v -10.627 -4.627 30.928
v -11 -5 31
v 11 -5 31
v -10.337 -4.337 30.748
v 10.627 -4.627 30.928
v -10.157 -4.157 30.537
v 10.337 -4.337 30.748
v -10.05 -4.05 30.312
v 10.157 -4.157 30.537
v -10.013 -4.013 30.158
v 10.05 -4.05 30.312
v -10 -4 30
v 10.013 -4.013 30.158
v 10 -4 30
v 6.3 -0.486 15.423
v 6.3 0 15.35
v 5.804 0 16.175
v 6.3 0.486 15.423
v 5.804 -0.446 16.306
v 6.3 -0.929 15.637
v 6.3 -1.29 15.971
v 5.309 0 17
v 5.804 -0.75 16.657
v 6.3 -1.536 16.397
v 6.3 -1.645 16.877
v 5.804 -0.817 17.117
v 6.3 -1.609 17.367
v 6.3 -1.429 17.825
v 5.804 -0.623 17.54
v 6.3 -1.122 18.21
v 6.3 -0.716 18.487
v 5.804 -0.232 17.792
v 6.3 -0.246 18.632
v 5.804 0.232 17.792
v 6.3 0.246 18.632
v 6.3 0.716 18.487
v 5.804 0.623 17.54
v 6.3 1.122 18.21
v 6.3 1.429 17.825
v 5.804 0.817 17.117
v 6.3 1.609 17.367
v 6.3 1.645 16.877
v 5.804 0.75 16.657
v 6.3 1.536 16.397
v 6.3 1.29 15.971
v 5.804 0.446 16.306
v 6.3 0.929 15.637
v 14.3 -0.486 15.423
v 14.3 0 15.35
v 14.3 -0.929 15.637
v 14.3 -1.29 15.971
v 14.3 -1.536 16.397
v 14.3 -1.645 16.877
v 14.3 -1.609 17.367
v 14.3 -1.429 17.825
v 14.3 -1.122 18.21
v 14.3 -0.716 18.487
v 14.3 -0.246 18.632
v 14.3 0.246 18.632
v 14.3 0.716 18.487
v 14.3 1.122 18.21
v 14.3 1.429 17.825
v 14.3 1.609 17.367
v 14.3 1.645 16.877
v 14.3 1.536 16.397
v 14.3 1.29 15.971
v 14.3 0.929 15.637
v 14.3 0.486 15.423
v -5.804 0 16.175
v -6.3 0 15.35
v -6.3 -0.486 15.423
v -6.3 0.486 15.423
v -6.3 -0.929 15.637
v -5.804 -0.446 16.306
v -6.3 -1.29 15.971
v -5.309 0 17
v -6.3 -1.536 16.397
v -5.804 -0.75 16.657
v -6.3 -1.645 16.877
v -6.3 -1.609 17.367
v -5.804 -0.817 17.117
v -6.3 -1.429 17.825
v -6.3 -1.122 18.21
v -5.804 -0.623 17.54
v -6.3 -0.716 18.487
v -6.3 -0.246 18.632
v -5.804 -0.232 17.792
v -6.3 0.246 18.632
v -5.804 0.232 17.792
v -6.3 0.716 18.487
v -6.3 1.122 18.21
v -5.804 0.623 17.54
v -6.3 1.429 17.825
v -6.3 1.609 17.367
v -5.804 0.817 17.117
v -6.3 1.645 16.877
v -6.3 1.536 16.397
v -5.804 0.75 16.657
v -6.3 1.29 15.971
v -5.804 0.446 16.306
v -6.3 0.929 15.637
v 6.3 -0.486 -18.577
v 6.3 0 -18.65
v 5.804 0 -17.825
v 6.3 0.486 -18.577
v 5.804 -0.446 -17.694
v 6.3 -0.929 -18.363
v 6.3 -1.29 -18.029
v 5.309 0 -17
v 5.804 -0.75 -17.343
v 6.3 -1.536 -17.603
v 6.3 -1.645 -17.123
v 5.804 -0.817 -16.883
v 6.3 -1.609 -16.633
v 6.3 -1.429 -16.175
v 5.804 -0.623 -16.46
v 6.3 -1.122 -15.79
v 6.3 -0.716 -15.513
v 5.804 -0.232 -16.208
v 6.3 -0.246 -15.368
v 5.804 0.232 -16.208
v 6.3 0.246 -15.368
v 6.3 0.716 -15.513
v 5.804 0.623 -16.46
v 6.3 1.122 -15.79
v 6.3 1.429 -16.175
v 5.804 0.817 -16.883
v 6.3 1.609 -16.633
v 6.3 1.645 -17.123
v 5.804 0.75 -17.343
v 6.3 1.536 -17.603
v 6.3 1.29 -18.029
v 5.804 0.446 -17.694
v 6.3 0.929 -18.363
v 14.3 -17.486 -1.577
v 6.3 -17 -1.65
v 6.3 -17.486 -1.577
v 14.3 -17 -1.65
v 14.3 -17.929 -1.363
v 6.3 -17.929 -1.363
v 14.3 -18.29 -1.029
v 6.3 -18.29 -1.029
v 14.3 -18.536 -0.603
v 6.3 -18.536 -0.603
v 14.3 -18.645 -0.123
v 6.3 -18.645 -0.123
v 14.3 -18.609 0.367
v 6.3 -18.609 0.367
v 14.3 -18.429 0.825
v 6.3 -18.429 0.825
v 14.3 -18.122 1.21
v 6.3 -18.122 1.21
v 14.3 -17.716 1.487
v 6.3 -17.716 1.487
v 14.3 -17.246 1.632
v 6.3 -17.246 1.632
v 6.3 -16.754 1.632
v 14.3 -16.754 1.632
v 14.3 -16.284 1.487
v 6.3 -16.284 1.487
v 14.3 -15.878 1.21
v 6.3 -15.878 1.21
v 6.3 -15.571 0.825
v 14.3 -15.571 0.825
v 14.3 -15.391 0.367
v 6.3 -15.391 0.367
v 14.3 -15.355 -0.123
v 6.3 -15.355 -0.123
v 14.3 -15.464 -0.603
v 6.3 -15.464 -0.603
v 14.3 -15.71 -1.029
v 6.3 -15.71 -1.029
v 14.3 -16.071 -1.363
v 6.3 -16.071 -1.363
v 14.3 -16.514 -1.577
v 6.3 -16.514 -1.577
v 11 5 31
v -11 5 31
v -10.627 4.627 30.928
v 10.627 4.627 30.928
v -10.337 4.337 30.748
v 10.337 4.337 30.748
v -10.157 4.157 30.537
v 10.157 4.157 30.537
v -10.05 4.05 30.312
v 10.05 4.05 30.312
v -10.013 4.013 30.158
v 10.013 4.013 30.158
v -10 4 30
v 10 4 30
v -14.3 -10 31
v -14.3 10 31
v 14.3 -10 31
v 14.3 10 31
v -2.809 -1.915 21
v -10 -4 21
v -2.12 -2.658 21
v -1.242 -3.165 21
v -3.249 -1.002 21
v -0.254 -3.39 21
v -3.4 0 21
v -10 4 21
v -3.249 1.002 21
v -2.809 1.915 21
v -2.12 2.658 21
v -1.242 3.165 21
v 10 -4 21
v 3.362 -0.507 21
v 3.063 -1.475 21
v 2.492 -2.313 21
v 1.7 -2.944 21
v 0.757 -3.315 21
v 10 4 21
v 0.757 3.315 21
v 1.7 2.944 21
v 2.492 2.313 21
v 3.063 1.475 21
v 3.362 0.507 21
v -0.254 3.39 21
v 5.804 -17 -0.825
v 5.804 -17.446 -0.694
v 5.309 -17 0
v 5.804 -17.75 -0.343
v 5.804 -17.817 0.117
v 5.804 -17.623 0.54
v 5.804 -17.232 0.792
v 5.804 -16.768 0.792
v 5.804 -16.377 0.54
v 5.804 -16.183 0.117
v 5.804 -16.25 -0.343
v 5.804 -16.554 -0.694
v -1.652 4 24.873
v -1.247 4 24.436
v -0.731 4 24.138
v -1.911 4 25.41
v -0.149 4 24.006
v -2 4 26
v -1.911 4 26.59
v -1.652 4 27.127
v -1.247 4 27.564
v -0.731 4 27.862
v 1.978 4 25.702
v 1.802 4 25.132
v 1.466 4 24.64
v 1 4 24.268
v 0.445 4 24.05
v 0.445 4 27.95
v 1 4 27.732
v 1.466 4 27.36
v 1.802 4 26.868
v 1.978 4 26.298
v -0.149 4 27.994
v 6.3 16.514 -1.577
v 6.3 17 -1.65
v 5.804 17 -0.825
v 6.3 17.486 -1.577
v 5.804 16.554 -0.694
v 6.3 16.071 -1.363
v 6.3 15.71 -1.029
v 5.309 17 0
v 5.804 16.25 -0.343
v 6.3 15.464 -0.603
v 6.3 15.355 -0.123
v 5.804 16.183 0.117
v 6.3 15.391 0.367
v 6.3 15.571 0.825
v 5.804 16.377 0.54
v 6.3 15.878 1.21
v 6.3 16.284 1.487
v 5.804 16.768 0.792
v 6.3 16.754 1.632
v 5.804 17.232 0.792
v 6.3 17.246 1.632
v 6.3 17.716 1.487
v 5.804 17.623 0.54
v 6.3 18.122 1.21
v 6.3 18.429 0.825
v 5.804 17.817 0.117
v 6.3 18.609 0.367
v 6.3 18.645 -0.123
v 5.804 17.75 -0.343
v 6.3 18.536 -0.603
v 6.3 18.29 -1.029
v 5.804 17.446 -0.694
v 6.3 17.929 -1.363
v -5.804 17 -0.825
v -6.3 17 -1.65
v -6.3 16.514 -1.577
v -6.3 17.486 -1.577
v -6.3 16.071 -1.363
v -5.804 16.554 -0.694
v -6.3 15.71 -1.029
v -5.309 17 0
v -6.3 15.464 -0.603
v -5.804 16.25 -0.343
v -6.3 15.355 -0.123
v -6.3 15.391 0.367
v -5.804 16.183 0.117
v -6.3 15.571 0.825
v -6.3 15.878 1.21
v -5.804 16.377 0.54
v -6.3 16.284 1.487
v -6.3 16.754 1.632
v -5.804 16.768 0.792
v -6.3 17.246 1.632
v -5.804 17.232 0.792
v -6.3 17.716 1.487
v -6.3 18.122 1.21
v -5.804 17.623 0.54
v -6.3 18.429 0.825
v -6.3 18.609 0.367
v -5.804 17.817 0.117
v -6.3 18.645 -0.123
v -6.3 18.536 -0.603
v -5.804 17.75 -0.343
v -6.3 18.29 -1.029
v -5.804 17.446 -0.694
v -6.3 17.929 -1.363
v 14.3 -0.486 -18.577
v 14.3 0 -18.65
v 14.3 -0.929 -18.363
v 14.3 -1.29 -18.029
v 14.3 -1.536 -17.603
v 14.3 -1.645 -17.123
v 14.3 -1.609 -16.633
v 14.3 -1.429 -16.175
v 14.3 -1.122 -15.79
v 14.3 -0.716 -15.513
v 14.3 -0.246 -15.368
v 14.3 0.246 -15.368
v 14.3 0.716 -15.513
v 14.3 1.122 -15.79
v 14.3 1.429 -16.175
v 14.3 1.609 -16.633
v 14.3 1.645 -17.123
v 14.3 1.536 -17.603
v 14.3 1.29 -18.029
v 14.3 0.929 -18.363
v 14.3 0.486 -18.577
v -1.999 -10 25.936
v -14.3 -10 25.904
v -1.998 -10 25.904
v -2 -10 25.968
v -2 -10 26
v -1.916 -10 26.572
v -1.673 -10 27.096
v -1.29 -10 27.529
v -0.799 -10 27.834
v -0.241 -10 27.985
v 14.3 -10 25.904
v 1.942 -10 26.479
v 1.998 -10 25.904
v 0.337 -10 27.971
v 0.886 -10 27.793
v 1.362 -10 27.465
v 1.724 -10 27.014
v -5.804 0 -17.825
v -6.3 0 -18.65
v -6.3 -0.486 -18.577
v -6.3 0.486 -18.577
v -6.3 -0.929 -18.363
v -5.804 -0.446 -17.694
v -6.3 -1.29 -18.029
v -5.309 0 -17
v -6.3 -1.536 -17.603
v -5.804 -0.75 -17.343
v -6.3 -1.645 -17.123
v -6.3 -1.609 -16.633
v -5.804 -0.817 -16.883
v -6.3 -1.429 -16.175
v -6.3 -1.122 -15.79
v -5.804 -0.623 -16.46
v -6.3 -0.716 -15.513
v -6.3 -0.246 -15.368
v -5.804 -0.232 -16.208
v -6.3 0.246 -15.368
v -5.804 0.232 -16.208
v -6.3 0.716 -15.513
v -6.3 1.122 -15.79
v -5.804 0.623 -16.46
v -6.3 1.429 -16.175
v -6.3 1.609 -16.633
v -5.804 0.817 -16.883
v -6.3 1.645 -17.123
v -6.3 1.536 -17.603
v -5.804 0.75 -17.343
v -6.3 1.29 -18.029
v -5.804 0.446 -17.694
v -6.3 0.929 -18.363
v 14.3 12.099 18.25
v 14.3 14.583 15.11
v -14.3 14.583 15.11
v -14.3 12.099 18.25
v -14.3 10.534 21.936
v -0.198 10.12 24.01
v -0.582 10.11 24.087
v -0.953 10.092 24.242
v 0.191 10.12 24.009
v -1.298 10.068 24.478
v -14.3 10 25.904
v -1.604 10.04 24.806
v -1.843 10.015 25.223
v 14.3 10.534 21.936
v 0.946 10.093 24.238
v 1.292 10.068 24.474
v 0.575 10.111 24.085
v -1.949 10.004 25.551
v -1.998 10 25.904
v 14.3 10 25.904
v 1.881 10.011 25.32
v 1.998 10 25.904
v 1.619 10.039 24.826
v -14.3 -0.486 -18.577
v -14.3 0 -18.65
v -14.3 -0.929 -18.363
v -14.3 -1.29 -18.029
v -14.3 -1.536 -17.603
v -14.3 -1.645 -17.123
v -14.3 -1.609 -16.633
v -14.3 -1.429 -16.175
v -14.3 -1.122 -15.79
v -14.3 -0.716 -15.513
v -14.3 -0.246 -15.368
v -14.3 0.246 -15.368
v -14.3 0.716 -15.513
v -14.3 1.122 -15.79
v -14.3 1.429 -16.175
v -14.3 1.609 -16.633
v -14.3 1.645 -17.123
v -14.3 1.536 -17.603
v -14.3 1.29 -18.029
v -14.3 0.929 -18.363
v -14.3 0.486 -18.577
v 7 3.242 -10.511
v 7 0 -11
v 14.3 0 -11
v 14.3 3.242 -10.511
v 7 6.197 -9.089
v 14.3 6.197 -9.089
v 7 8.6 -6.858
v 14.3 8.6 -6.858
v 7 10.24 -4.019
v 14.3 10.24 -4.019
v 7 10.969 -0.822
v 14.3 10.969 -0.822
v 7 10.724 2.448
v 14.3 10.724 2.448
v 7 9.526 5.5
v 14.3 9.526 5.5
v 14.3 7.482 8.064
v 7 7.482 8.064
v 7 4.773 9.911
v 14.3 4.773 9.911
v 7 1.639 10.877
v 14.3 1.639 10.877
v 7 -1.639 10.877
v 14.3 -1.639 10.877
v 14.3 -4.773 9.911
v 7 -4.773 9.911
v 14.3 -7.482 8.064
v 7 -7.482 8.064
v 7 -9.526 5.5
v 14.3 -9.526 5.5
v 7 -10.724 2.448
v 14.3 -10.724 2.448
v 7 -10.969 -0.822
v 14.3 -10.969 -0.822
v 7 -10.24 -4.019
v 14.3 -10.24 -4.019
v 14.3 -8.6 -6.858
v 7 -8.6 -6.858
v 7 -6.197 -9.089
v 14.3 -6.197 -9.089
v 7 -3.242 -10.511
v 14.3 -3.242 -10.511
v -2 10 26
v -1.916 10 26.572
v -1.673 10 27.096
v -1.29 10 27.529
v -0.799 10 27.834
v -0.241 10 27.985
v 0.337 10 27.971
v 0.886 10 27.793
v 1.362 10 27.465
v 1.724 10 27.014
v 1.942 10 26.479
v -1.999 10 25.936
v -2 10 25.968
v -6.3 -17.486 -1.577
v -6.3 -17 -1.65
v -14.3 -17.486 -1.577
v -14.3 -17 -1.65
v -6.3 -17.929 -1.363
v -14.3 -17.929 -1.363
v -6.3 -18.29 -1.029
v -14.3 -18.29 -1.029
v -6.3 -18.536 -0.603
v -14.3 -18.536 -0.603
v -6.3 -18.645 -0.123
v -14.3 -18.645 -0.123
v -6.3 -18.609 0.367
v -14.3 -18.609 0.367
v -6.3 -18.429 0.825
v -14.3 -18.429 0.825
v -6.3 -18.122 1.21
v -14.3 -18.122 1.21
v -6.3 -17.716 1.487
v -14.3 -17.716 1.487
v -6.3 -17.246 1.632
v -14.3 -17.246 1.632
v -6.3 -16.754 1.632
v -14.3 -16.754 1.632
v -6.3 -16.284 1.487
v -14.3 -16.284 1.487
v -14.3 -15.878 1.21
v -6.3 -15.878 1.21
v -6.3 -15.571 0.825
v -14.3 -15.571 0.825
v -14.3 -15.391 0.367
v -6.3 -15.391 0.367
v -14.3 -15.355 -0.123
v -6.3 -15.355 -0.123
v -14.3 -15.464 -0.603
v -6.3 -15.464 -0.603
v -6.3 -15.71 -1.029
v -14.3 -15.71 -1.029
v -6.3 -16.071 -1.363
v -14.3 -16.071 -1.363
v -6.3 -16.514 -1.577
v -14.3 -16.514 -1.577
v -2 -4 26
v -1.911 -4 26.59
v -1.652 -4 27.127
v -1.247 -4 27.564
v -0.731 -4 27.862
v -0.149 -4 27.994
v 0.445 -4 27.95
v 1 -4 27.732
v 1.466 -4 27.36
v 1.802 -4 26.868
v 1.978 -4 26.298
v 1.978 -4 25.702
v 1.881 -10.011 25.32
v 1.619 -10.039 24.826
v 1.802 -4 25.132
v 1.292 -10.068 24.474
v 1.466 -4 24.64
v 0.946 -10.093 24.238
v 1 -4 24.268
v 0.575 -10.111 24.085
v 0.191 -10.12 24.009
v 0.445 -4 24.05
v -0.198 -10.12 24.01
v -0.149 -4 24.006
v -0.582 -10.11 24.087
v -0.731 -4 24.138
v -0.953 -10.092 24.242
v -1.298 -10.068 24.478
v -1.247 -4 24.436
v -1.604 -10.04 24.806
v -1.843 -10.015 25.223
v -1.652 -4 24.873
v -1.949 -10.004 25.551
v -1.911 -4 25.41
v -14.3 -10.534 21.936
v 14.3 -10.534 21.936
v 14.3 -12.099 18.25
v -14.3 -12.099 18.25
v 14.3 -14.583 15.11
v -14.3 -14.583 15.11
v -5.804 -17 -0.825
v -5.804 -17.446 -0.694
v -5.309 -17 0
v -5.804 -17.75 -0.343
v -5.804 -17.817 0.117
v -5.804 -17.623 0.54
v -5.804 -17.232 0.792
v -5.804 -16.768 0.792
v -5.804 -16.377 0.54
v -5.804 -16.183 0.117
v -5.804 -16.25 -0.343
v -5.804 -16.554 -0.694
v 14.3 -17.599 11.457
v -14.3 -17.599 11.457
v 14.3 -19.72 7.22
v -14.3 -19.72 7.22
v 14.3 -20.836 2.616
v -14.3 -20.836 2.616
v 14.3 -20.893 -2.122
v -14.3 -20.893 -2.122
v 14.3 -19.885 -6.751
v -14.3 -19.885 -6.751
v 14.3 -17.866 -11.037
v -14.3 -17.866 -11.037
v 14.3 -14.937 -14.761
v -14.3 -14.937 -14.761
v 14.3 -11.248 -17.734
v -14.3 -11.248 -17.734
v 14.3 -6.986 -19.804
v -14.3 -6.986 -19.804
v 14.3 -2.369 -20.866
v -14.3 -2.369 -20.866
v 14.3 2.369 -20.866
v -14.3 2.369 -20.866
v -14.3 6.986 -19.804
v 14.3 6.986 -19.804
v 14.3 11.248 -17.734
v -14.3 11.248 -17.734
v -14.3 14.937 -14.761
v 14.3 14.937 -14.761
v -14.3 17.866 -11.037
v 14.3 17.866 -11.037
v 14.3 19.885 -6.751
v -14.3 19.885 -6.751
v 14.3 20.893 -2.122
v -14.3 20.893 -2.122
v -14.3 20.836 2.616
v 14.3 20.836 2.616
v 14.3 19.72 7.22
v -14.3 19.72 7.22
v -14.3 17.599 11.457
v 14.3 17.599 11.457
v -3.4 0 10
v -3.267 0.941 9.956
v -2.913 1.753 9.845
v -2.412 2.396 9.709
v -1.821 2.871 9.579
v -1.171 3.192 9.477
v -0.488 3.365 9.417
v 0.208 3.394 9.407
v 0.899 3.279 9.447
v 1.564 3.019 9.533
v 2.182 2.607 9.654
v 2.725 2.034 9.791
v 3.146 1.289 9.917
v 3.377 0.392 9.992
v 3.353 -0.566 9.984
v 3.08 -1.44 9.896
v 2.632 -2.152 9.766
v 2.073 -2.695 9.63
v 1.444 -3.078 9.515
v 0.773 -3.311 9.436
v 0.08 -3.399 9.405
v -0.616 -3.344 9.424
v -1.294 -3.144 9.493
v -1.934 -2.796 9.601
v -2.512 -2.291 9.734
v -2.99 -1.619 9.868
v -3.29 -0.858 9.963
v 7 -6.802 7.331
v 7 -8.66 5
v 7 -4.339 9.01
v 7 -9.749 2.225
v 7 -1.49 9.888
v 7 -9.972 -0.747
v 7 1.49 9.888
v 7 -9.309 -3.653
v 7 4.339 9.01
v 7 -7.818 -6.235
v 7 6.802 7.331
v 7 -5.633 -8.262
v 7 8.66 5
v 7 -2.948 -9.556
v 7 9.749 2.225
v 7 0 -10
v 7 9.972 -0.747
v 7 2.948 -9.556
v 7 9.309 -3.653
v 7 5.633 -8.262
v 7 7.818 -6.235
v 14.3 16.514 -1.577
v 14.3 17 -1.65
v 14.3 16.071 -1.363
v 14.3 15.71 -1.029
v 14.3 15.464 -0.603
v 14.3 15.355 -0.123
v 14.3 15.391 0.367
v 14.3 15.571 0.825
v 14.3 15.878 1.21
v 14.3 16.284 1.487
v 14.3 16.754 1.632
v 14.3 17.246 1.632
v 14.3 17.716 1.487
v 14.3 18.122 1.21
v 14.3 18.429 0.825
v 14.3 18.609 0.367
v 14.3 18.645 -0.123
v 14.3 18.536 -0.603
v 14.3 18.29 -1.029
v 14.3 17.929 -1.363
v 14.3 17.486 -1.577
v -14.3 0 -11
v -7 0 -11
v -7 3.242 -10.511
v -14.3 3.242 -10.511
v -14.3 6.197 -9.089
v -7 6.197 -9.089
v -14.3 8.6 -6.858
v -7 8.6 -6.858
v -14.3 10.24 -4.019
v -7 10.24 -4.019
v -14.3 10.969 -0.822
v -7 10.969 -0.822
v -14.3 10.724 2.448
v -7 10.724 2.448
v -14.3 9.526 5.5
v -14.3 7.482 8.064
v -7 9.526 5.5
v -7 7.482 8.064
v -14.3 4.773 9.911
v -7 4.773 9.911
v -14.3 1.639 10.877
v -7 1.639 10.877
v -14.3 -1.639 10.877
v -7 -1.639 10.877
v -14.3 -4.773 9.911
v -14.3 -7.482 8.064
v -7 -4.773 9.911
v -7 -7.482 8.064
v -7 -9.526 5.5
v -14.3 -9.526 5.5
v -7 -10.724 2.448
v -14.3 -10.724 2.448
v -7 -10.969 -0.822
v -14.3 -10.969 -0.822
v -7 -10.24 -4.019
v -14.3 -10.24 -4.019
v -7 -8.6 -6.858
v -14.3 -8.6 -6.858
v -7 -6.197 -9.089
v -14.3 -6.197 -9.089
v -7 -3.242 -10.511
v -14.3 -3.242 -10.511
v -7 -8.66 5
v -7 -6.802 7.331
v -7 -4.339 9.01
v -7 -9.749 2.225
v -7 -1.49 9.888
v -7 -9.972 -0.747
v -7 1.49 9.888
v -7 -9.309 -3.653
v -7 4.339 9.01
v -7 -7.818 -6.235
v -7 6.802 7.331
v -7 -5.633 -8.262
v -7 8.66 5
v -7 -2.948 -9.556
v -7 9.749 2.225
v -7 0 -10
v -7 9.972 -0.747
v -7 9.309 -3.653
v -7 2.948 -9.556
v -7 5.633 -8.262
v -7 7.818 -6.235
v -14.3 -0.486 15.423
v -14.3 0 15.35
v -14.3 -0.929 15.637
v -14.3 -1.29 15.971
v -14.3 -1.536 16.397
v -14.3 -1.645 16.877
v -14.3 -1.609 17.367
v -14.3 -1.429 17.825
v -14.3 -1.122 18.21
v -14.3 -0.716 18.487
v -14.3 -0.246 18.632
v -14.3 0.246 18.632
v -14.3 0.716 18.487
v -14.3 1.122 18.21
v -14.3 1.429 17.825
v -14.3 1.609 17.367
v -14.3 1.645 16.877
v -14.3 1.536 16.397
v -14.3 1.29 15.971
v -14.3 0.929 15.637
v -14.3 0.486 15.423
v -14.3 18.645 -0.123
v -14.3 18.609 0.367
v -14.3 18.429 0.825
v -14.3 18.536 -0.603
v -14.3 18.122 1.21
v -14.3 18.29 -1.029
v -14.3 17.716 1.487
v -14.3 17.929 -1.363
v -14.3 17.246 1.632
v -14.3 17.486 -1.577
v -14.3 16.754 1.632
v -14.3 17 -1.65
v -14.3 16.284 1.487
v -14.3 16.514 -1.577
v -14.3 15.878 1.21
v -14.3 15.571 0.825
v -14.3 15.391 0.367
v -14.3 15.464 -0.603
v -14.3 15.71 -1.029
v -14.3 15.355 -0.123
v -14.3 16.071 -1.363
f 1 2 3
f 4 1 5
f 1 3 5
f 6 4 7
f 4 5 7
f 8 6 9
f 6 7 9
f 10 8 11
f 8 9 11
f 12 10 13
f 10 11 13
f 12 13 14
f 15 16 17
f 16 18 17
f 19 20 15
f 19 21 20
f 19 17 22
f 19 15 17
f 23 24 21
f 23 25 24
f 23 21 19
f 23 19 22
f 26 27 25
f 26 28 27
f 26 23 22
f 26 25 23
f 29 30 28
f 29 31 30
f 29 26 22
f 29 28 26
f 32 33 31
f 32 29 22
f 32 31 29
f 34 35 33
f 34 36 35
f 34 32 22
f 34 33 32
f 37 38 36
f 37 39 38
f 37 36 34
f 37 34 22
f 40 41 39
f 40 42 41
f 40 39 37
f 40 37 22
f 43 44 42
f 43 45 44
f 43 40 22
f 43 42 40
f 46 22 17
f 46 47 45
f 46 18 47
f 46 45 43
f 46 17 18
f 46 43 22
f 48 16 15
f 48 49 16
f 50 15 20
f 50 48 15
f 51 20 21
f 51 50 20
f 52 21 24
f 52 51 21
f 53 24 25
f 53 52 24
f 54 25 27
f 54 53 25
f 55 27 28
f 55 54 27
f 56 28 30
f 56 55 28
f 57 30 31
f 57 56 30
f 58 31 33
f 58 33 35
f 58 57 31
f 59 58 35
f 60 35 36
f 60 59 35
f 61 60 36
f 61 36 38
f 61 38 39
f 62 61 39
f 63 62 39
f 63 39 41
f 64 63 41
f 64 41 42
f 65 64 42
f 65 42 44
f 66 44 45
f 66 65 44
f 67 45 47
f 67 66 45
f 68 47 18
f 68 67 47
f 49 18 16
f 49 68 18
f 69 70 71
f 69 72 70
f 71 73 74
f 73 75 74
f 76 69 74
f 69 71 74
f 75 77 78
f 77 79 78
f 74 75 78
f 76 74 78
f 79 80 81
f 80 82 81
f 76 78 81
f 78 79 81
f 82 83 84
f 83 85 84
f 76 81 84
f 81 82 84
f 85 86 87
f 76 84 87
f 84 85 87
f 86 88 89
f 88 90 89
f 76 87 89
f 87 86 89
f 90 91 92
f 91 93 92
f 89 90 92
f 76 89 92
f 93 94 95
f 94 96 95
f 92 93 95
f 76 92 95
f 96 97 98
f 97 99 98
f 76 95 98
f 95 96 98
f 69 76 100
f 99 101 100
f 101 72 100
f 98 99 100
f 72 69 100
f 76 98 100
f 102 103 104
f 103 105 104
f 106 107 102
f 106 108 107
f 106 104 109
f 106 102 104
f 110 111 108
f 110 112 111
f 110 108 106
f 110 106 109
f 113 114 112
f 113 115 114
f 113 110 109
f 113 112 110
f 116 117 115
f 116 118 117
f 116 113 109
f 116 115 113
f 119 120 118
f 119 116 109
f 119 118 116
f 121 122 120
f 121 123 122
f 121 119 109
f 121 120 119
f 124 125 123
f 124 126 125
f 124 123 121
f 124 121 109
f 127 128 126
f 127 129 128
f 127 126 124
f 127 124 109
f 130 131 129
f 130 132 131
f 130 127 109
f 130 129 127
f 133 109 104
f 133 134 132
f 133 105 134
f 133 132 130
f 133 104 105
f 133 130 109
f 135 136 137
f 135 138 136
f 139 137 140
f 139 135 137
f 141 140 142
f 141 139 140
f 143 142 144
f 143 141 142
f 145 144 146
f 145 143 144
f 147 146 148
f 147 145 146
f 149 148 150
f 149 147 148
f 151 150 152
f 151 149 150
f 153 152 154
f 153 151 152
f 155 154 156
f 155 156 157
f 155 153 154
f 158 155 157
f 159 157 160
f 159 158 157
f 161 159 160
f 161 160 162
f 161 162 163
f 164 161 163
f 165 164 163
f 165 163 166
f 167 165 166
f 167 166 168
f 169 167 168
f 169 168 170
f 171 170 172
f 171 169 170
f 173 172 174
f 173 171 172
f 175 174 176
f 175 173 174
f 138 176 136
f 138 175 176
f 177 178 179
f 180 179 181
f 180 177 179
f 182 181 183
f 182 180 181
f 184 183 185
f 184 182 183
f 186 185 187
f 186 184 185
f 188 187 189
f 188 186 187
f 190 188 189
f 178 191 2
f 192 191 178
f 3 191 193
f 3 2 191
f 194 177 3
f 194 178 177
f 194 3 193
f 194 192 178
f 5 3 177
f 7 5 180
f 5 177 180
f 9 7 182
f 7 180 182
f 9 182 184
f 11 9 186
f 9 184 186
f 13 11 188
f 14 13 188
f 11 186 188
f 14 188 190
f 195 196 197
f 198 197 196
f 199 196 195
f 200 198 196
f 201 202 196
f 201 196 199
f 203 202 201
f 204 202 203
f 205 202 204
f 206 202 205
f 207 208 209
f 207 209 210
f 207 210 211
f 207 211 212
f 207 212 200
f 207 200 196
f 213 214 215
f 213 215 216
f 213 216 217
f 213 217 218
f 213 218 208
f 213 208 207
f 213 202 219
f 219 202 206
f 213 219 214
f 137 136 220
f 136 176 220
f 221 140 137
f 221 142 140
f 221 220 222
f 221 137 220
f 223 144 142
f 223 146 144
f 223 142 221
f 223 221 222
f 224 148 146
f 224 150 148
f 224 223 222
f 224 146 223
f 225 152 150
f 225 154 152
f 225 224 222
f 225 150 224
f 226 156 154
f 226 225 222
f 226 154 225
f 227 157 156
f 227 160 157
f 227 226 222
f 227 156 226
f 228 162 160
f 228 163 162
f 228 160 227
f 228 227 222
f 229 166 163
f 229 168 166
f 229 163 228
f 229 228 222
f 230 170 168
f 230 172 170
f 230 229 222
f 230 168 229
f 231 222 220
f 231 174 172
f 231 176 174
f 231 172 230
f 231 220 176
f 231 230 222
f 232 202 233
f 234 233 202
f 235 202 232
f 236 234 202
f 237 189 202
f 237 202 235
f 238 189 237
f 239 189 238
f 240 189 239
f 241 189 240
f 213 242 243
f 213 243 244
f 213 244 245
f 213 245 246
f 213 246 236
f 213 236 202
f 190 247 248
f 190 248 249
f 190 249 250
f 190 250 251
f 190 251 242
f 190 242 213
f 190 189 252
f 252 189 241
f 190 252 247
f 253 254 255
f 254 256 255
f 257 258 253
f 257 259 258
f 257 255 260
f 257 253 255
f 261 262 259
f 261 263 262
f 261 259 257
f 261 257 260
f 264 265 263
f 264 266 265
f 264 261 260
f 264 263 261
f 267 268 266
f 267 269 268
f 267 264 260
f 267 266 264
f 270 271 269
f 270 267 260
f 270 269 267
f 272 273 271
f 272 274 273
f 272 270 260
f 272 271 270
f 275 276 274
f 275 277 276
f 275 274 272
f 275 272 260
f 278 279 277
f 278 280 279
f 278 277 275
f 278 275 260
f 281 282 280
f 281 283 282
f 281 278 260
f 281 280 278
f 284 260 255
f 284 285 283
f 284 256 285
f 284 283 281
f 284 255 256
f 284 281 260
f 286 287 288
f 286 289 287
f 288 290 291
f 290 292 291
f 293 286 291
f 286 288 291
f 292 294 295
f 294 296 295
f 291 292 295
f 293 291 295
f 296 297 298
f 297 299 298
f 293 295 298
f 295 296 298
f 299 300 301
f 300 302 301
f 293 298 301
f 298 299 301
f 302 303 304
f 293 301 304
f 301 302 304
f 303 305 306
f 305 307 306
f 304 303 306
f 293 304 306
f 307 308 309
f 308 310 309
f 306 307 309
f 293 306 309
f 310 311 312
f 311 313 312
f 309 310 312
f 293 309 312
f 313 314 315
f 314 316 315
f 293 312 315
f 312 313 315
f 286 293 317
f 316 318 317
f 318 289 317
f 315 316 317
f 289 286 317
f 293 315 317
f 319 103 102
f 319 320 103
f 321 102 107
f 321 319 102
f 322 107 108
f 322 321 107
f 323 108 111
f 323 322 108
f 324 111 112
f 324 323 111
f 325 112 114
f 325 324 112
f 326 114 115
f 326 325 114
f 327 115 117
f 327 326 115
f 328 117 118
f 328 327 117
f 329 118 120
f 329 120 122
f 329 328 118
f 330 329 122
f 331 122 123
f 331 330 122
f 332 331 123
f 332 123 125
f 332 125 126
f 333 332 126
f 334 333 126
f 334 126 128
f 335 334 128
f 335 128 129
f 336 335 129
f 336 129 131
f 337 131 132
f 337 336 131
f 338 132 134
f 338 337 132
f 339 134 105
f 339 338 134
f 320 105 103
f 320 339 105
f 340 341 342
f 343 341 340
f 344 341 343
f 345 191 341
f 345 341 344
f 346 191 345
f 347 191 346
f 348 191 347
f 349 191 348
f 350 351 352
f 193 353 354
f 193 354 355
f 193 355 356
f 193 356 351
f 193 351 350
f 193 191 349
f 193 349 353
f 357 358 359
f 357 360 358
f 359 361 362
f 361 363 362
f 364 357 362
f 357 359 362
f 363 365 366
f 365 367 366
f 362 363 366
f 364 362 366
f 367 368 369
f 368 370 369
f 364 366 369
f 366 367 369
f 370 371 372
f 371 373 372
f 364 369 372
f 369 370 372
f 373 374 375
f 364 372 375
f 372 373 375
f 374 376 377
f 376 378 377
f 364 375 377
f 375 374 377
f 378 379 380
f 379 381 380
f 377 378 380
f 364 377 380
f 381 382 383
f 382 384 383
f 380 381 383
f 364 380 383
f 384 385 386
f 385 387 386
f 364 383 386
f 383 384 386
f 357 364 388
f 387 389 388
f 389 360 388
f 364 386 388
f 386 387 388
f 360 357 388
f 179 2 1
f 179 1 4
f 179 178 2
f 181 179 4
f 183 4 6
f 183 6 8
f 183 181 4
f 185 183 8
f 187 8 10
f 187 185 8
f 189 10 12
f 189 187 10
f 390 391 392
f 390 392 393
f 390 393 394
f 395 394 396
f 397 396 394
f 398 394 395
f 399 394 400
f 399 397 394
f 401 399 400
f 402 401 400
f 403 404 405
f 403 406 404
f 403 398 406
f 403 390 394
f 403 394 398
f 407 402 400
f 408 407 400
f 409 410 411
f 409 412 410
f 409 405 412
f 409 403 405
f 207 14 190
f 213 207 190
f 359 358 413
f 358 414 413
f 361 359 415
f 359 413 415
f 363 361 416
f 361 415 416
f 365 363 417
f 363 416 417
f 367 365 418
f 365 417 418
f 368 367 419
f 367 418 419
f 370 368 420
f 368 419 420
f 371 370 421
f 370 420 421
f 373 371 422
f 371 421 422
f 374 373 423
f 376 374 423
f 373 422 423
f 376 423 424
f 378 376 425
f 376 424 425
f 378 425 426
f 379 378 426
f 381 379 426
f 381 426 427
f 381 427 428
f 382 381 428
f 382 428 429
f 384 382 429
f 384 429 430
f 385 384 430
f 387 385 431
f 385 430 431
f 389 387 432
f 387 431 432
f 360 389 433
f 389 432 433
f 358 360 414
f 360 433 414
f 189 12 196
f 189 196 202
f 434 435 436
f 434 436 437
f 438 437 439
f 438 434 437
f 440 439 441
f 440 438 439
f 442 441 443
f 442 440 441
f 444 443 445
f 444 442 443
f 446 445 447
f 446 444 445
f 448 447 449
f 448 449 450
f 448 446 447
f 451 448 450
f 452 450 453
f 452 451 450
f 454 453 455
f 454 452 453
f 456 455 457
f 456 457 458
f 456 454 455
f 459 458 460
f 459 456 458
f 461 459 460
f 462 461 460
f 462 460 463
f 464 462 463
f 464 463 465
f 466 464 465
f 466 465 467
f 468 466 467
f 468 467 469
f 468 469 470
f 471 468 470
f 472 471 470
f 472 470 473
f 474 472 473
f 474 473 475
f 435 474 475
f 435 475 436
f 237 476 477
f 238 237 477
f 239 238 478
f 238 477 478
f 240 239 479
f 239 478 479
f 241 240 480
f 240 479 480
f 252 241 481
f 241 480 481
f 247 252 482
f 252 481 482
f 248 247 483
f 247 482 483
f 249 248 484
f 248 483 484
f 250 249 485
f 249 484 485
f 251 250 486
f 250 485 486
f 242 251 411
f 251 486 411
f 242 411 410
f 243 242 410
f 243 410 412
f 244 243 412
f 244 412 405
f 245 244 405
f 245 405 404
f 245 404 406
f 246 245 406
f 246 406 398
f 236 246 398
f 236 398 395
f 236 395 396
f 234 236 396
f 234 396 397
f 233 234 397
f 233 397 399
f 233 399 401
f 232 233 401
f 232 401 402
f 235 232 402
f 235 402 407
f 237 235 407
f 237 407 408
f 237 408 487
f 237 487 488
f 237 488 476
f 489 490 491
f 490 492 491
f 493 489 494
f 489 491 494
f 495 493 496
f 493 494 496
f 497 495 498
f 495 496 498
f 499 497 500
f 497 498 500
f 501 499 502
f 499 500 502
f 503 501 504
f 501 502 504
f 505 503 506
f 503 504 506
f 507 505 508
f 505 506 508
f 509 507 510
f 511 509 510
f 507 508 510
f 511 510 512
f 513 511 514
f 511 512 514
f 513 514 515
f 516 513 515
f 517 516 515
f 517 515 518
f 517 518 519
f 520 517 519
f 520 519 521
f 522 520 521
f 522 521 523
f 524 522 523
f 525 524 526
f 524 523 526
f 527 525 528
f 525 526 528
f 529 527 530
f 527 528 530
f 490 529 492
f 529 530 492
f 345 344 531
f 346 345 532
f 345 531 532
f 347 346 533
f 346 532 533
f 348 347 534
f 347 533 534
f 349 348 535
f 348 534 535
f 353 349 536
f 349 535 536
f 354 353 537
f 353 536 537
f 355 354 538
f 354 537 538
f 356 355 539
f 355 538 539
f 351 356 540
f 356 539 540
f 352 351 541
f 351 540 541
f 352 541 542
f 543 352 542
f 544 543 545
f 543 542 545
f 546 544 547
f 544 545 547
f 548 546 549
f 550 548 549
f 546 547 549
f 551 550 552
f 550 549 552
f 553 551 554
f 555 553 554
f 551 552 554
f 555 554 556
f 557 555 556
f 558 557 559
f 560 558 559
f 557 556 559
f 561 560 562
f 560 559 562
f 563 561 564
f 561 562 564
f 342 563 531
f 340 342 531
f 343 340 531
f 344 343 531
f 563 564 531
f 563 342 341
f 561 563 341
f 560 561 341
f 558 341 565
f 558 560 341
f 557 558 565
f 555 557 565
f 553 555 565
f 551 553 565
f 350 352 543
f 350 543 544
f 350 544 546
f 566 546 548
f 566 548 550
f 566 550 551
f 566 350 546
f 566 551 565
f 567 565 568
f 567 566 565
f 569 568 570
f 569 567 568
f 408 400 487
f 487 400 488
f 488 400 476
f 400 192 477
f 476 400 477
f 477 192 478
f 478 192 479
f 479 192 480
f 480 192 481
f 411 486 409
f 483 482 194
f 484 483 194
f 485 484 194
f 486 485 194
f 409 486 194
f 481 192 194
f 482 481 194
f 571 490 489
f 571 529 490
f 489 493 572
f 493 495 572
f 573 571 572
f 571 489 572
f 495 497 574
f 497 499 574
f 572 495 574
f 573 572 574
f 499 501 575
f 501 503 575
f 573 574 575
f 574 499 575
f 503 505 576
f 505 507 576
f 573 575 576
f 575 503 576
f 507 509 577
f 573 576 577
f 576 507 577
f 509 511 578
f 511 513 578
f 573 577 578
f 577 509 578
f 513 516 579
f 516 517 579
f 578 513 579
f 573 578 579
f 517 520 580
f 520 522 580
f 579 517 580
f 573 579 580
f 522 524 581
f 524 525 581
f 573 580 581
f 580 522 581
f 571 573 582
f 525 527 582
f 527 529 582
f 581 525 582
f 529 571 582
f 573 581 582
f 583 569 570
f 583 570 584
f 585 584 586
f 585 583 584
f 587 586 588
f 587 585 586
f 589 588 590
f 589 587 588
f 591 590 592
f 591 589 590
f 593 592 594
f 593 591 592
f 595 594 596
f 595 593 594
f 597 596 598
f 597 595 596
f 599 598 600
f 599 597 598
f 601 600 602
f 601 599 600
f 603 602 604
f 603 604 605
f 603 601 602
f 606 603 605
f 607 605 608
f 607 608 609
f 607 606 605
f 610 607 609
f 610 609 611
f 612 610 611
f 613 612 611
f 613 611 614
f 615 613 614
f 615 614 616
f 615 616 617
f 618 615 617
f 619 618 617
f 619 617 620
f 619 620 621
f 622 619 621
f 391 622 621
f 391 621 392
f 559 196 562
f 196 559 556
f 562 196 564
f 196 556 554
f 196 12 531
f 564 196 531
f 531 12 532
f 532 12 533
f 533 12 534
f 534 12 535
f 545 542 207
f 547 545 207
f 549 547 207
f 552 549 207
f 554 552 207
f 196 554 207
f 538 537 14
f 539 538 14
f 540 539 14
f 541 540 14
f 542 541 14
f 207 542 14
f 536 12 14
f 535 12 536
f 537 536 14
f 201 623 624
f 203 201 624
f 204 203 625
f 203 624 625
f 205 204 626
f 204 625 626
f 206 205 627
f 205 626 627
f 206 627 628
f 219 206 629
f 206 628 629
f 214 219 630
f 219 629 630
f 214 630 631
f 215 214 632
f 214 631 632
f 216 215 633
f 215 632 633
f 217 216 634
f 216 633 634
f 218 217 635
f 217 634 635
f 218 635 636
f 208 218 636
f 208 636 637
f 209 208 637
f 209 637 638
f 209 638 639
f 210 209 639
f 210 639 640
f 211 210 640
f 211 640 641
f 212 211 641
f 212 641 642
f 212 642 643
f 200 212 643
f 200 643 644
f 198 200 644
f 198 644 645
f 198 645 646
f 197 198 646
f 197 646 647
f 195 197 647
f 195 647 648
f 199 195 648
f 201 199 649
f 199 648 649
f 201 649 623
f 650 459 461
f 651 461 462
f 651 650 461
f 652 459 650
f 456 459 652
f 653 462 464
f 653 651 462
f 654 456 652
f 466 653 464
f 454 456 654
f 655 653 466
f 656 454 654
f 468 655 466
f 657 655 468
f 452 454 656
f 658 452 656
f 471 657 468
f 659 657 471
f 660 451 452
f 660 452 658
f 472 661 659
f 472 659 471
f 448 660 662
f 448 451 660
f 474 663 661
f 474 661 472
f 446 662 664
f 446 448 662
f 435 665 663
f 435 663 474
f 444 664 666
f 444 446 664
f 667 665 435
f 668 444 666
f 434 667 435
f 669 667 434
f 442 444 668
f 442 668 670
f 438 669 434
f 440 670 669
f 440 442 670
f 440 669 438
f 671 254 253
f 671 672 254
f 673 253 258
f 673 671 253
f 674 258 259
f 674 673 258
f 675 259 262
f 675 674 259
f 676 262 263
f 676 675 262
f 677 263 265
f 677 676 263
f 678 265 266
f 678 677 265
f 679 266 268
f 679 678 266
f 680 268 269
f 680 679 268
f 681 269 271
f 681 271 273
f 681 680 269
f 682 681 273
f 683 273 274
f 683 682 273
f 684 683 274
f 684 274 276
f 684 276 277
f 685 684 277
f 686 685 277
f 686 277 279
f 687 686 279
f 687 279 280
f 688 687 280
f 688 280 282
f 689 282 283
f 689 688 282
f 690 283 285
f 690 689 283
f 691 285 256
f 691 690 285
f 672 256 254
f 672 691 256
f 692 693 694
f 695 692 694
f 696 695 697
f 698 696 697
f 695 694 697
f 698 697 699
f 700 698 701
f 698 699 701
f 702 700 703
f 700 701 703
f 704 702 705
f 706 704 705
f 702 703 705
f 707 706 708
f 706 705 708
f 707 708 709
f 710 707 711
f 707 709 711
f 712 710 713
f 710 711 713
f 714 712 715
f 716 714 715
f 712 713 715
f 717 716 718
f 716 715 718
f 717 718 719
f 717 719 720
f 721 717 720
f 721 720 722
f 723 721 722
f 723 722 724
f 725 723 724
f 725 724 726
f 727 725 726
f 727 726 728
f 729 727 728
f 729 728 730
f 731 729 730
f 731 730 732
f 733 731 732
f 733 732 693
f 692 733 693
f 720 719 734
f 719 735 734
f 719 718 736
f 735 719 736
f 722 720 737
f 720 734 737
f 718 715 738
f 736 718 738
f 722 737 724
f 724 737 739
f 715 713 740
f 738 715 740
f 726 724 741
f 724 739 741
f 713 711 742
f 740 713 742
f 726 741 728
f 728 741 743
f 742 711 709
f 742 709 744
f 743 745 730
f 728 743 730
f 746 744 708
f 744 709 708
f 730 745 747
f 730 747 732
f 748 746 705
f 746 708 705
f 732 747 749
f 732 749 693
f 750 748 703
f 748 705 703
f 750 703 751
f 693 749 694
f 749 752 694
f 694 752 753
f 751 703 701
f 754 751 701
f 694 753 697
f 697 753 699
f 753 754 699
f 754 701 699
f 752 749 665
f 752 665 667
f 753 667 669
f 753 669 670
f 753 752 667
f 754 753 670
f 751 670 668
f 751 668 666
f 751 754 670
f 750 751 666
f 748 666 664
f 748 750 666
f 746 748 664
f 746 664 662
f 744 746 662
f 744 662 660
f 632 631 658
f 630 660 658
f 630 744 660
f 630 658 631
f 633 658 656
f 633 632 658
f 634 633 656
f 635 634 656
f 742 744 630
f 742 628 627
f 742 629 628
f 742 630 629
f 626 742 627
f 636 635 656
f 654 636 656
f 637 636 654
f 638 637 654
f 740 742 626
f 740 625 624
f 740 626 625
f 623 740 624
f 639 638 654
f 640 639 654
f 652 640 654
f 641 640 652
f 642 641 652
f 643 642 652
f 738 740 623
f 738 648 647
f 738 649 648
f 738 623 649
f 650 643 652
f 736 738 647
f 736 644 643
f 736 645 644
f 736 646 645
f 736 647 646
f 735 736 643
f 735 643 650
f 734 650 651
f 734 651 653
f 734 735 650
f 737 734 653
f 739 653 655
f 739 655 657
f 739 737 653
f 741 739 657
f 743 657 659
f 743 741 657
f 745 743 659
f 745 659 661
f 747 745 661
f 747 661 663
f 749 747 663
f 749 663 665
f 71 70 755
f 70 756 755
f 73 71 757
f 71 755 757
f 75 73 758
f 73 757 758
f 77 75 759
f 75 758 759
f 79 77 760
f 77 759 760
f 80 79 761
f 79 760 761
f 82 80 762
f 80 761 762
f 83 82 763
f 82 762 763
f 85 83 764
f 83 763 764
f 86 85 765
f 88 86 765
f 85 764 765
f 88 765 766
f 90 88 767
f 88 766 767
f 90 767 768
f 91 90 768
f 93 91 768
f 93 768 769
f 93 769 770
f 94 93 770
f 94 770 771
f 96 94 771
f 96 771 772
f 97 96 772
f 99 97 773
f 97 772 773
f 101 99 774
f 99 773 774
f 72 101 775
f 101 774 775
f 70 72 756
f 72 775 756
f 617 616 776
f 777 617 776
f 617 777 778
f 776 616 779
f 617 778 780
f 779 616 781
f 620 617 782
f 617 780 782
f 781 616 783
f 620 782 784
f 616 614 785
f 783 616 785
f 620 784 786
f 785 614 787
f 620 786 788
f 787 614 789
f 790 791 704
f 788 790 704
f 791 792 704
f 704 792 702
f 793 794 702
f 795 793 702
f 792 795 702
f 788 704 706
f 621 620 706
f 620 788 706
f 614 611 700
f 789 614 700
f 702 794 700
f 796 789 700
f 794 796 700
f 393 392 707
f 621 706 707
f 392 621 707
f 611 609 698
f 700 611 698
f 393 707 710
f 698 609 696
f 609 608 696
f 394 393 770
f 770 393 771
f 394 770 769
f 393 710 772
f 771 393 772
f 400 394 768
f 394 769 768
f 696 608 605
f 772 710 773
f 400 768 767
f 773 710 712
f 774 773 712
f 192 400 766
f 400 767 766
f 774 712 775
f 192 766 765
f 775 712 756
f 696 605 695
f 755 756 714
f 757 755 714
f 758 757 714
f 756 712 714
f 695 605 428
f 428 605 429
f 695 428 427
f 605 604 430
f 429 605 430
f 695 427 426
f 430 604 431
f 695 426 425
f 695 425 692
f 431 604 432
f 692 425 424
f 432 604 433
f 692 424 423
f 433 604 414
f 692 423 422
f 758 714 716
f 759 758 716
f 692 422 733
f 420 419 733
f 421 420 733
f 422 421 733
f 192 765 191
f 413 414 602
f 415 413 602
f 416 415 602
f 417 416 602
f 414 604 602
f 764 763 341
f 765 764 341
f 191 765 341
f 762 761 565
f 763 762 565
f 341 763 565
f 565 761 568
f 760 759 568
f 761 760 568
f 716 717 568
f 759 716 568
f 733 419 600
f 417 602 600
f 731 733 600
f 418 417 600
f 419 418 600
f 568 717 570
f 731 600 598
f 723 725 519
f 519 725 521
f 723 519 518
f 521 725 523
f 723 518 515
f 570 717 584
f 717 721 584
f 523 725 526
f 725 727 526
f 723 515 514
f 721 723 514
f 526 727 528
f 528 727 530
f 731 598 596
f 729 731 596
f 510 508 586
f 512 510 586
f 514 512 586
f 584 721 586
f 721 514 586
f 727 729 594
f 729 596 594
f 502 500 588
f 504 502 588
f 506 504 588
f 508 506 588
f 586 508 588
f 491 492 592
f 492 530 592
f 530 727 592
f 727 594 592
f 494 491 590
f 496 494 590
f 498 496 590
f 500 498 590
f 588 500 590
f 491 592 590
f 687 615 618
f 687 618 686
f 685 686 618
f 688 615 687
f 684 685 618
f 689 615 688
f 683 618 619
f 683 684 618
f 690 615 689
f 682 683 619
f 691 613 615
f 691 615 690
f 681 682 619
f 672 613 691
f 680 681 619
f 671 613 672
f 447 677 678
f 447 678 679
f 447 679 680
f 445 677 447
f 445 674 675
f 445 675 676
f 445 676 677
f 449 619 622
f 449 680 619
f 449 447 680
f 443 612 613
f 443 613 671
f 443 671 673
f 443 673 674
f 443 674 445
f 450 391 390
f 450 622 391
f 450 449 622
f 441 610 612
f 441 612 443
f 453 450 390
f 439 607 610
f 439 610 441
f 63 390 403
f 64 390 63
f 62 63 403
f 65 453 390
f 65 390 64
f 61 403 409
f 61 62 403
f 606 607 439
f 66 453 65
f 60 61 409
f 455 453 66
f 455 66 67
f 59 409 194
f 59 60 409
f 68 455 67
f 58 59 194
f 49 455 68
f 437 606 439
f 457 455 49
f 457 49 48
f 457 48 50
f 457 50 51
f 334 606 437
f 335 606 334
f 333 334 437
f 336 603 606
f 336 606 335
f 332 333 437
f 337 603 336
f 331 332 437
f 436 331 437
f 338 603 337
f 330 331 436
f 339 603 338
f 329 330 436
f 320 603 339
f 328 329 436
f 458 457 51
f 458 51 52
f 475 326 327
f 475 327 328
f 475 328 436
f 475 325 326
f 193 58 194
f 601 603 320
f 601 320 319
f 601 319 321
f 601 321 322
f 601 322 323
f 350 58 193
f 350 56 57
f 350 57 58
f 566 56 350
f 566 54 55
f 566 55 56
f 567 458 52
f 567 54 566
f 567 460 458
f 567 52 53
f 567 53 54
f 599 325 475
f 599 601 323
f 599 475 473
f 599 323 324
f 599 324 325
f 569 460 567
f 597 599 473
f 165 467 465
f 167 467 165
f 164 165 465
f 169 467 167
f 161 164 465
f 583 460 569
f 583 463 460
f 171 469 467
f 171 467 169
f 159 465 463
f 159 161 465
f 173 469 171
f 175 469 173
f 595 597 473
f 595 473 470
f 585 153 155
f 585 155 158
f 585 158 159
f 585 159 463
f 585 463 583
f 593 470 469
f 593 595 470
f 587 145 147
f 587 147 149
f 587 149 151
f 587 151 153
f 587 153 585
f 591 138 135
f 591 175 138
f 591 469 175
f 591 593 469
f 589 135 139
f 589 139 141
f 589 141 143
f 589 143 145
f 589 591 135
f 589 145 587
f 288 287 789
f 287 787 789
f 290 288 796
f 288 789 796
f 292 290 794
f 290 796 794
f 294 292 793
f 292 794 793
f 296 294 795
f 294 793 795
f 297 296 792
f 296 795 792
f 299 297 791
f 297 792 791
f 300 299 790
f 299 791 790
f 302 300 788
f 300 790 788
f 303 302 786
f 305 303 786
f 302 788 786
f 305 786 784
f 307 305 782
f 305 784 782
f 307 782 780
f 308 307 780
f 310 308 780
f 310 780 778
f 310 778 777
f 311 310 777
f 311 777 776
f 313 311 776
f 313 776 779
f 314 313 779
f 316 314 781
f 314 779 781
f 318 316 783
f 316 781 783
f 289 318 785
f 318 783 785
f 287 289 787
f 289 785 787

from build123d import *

# Parameters (mm, degrees)
SKETCH3_R                  = 21
SKETCH3_R_2                = 11
BOSS_EXTRUDE1_DEPTH        = 14.3
SKETCH4_R                  = 21
SKETCH4_R_2                = 10
BOSS_EXTRUDE2_DEPTH        = 7
M4_TAPPED_HOLE1_AT_2_COUNT = 2
M4_TAPPED_HOLE1_AT_2_PITCH = 24.04163056
M4_TAPPED_HOLE1_AT_3_COUNT = 2
M4_TAPPED_HOLE1_AT_3_PITCH = 34
M4_TAPPED_HOLE1_AT_4_COUNT = 2
M4_TAPPED_HOLE1_AT_4_PITCH = 24.04163056
BOSS_EXTRUDE3_REACH        = 59.875
BOSS_EXTRUDE3_END_RADIUS   = 21
SKETCH7_W                  = 28.6
SKETCH7_H                  = 20
SKETCH11_W                 = 20
SKETCH11_H                 = 8
CUT_EXTRUDE2_DEPTH         = 10
SKETCH12_R                 = 2
CUT_EXTRUDE3_DEPTH         = 47.113880774
FILLET1_R                  = 15
FILLET5_R                  = 1
M8_TAPPED_HOLE1_D          = 6.8
M8_TAPPED_HOLE1_DEPTH      = 19.75
M8_TAPPED_HOLE1_TIP        = 2.042926105


with BuildPart() as part:
    # Sketch3 → Boss-Extrude1 (new body)
    with BuildSketch(Plane(origin=(0, 0, 0), x_dir=(0, 0, -1), z_dir=(1, 0, 0))):
        Circle(SKETCH3_R)
        Circle(SKETCH3_R_2, mode=Mode.SUBTRACT)
    boss_extrude1 = extrude(amount=BOSS_EXTRUDE1_DEPTH)

    # Sketch4 → Boss-Extrude2 (add)
    with BuildSketch(Plane(origin=(0, 0, 0), x_dir=(0, 0, -1), z_dir=(1, 0, 0))):
        Circle(SKETCH4_R)
        Circle(SKETCH4_R_2, mode=Mode.SUBTRACT)
    boss_extrude2 = extrude(amount=BOSS_EXTRUDE2_DEPTH)

    # Sketch15 → M4 Tapped Hole1 (revolve, cut)
    with BuildSketch(Plane(origin=(14.3, 17, 0), x_dir=(0, 0, -1), z_dir=(0, 1, 0))):
        Polygon((0, 0), (0, 8.991420021), (1.65, 8), (1.65, 0), align=None)
    m4_tapped_hole1 = revolve(axis=Axis((20.65, 17, 0), (-1, 0, 0)), mode=Mode.SUBTRACT)

    # M4 Tapped Hole1 at 2: M4 Tapped Hole1 ×2
    with Locations(*[Vector(0, -0.7071067811865479, -0.7071067811865472) * (i * M4_TAPPED_HOLE1_AT_2_PITCH) for i in range(1, M4_TAPPED_HOLE1_AT_2_COUNT)]):
        add(m4_tapped_hole1, mode=Mode.SUBTRACT)

    # M4 Tapped Hole1 at 3: M4 Tapped Hole1 ×2
    with Locations(*[(0, -i * M4_TAPPED_HOLE1_AT_3_PITCH, 0) for i in range(1, M4_TAPPED_HOLE1_AT_3_COUNT)]):
        add(m4_tapped_hole1, mode=Mode.SUBTRACT)

    # M4 Tapped Hole1 at 4: M4 Tapped Hole1 ×2
    with Locations(*[Vector(0, -0.7071067811865474, 0.7071067811865478) * (i * M4_TAPPED_HOLE1_AT_4_PITCH) for i in range(1, M4_TAPPED_HOLE1_AT_4_COUNT)]):
        add(m4_tapped_hole1, mode=Mode.SUBTRACT)

    # Mirror1: Boss-Extrude1, Boss-Extrude2, M4 Tapped Hole1 across plane
    add(boss_extrude1.mirror(Plane(origin=(0, 0, 0), x_dir=(0, 0, 1), z_dir=(1, 0, 0))))
    add(boss_extrude2.mirror(Plane(origin=(0, 0, 0), x_dir=(0, 0, 1), z_dir=(1, 0, 0))))
    add(m4_tapped_hole1.mirror(Plane(origin=(0, 0, 0), x_dir=(0, 0, 1), z_dir=(1, 0, 0))), mode=Mode.SUBTRACT)

    # Mirror1 copy 1 sketch → Mirror1 copy 1 (revolve, cut)
    with BuildSketch(Plane(origin=(-14.3, 0, -17), x_dir=(0, 0, -1), z_dir=(0, 1, 0))):
        Polygon((0, 0), (0, -8.991420021), (1.65, -8), (1.65, 0), align=None)
    revolve(axis=Axis((-20.65, 0, -17), (-1, 0, 0)), mode=Mode.SUBTRACT)

    # Mirror1 copy 2 sketch → Mirror1 copy 2 (revolve, cut)
    with BuildSketch(Plane(origin=(-14.3, -17, 0), x_dir=(0, 0, -1), z_dir=(0, 1, 0))):
        Polygon((0, 0), (0, -8.991420021), (1.65, -8), (1.65, 0), align=None)
    revolve(axis=Axis((-20.65, -17, 0), (-1, 0, 0)), mode=Mode.SUBTRACT)

    # Mirror1 copy 3 sketch → Mirror1 copy 3 (revolve, cut)
    with BuildSketch(Plane(origin=(-14.3, 0, 17), x_dir=(0, 0, -1), z_dir=(0, 1, 0))):
        Polygon((0, 0), (0, -8.991420021), (1.65, -8), (1.65, 0), align=None)
    revolve(axis=Axis((-20.65, 0, 17), (-1, 0, 0)), mode=Mode.SUBTRACT)

    # Boss-Extrude3: up to this cylinder (the profile starts outside it)
    boss_extrude3_end = Plane(origin=(0, 0, 0), z_dir=(-1, 0, 0)) * Cylinder(BOSS_EXTRUDE3_END_RADIUS, 162.75, mode=Mode.PRIVATE)
    # Sketch7 → Boss-Extrude3 (add, up to the surface)
    with BuildSketch(Plane.XY.offset(31), mode=Mode.PRIVATE) as boss_extrude3_sk1:
        Rectangle(SKETCH7_W, SKETCH7_H)
    boss_extrude3_tool1 = extrude(boss_extrude3_sk1.sketch, amount=-BOSS_EXTRUDE3_REACH, mode=Mode.PRIVATE) - boss_extrude3_end
    add(boss_extrude3_tool1.solids().sort_by_distance((0, 0, 31))[0])

    # Sketch11 → Cut-Extrude2 (cut)
    with BuildSketch(Plane.XY.offset(31)):
        Rectangle(SKETCH11_W, SKETCH11_H)
    extrude(amount=-CUT_EXTRUDE2_DEPTH, mode=Mode.SUBTRACT)

    # Sketch12 → Cut-Extrude3 (cut, through all)
    with BuildSketch(Plane(origin=(0, 10, 0), x_dir=(1, 0, 0), z_dir=(0, 1, 0))):
        with Locations(Location((0, -26, 0), (0, 0, 180))):
            Circle(SKETCH12_R)
    extrude(amount=-CUT_EXTRUDE3_DEPTH, mode=Mode.SUBTRACT)

    # Fillet1
    # the kernel refuses this fillet: 15 mm, written as the material it adds along each edge
    with BuildSketch(Plane(origin=(14.3, -10, 18.466185313), x_dir=(0, -0.8068579760983849, -0.5907454666829176), z_dir=(-1, 0, 0))) as fillet1_piece_1_section:
        with BuildLine():
            CenterArc((7.709210641, 14.862173982), FILLET1_R, 216.20992664, 46.01703687)
            Line((-4.393659, 6.000991981), (0, 0))
            ThreePointArc((0, 0), (2.840235499, 0.192956426), (5.680470999, 0))
        make_face()
    fillet1_piece_1 = extrude(amount=28.6, mode=Mode.PRIVATE)
    fillet1_piece_1 = fillet1_piece_1 - Plane(origin=(0, -10.967889591, 26), x_dir=(-1, 0, 0), z_dir=(0, 1, 0)) * Cylinder(2, 82, mode=Mode.PRIVATE)
    add(fillet1_piece_1)
    with BuildSketch(Plane(origin=(14.3, 10, 18.466185313), x_dir=(0, 0.8068579760983845, -0.5907454666829182), z_dir=(-1, 0, 0))) as fillet1_piece_2_section:
        with BuildLine():
            CenterArc((7.709210641, -14.862173982), FILLET1_R, 97.773036491, 46.01703687)
            Line((-4.393659, -6.000991981), (0, 0))
            ThreePointArc((0, 0), (2.840235499, -0.192956426), (5.680470999, 0))
        make_face()
    fillet1_piece_2 = extrude(amount=28.6, mode=Mode.PRIVATE)
    fillet1_piece_2 = fillet1_piece_2 - Plane(origin=(0, 10.967889591, 26), x_dir=(-1, 0, 0), z_dir=(0, 1, 0)) * Cylinder(2, 82, mode=Mode.PRIVATE)
    add(fillet1_piece_2)

    # Fillet5
    fillet5_edges = [part.edges().sort_by_distance(p)[0] for p in [
        (10, 0, 31),
        (0, 4, 31),
        (-10, 0, 31),
        (0, -4, 31),
    ]]
    fillet(fillet5_edges, radius=FILLET5_R)

    # M8 Tapped Hole1
    with Locations(Plane.XY.offset(21)):
        with Locations((0, 0)):
            Hole(M8_TAPPED_HOLE1_D / 2, depth=M8_TAPPED_HOLE1_DEPTH)
            with Locations((0, 0, -(M8_TAPPED_HOLE1_DEPTH + M8_TAPPED_HOLE1_TIP / 2))):  # 118° drill point
                Cone(0, M8_TAPPED_HOLE1_D / 2, M8_TAPPED_HOLE1_TIP, mode=Mode.SUBTRACT)


solid = part.part
